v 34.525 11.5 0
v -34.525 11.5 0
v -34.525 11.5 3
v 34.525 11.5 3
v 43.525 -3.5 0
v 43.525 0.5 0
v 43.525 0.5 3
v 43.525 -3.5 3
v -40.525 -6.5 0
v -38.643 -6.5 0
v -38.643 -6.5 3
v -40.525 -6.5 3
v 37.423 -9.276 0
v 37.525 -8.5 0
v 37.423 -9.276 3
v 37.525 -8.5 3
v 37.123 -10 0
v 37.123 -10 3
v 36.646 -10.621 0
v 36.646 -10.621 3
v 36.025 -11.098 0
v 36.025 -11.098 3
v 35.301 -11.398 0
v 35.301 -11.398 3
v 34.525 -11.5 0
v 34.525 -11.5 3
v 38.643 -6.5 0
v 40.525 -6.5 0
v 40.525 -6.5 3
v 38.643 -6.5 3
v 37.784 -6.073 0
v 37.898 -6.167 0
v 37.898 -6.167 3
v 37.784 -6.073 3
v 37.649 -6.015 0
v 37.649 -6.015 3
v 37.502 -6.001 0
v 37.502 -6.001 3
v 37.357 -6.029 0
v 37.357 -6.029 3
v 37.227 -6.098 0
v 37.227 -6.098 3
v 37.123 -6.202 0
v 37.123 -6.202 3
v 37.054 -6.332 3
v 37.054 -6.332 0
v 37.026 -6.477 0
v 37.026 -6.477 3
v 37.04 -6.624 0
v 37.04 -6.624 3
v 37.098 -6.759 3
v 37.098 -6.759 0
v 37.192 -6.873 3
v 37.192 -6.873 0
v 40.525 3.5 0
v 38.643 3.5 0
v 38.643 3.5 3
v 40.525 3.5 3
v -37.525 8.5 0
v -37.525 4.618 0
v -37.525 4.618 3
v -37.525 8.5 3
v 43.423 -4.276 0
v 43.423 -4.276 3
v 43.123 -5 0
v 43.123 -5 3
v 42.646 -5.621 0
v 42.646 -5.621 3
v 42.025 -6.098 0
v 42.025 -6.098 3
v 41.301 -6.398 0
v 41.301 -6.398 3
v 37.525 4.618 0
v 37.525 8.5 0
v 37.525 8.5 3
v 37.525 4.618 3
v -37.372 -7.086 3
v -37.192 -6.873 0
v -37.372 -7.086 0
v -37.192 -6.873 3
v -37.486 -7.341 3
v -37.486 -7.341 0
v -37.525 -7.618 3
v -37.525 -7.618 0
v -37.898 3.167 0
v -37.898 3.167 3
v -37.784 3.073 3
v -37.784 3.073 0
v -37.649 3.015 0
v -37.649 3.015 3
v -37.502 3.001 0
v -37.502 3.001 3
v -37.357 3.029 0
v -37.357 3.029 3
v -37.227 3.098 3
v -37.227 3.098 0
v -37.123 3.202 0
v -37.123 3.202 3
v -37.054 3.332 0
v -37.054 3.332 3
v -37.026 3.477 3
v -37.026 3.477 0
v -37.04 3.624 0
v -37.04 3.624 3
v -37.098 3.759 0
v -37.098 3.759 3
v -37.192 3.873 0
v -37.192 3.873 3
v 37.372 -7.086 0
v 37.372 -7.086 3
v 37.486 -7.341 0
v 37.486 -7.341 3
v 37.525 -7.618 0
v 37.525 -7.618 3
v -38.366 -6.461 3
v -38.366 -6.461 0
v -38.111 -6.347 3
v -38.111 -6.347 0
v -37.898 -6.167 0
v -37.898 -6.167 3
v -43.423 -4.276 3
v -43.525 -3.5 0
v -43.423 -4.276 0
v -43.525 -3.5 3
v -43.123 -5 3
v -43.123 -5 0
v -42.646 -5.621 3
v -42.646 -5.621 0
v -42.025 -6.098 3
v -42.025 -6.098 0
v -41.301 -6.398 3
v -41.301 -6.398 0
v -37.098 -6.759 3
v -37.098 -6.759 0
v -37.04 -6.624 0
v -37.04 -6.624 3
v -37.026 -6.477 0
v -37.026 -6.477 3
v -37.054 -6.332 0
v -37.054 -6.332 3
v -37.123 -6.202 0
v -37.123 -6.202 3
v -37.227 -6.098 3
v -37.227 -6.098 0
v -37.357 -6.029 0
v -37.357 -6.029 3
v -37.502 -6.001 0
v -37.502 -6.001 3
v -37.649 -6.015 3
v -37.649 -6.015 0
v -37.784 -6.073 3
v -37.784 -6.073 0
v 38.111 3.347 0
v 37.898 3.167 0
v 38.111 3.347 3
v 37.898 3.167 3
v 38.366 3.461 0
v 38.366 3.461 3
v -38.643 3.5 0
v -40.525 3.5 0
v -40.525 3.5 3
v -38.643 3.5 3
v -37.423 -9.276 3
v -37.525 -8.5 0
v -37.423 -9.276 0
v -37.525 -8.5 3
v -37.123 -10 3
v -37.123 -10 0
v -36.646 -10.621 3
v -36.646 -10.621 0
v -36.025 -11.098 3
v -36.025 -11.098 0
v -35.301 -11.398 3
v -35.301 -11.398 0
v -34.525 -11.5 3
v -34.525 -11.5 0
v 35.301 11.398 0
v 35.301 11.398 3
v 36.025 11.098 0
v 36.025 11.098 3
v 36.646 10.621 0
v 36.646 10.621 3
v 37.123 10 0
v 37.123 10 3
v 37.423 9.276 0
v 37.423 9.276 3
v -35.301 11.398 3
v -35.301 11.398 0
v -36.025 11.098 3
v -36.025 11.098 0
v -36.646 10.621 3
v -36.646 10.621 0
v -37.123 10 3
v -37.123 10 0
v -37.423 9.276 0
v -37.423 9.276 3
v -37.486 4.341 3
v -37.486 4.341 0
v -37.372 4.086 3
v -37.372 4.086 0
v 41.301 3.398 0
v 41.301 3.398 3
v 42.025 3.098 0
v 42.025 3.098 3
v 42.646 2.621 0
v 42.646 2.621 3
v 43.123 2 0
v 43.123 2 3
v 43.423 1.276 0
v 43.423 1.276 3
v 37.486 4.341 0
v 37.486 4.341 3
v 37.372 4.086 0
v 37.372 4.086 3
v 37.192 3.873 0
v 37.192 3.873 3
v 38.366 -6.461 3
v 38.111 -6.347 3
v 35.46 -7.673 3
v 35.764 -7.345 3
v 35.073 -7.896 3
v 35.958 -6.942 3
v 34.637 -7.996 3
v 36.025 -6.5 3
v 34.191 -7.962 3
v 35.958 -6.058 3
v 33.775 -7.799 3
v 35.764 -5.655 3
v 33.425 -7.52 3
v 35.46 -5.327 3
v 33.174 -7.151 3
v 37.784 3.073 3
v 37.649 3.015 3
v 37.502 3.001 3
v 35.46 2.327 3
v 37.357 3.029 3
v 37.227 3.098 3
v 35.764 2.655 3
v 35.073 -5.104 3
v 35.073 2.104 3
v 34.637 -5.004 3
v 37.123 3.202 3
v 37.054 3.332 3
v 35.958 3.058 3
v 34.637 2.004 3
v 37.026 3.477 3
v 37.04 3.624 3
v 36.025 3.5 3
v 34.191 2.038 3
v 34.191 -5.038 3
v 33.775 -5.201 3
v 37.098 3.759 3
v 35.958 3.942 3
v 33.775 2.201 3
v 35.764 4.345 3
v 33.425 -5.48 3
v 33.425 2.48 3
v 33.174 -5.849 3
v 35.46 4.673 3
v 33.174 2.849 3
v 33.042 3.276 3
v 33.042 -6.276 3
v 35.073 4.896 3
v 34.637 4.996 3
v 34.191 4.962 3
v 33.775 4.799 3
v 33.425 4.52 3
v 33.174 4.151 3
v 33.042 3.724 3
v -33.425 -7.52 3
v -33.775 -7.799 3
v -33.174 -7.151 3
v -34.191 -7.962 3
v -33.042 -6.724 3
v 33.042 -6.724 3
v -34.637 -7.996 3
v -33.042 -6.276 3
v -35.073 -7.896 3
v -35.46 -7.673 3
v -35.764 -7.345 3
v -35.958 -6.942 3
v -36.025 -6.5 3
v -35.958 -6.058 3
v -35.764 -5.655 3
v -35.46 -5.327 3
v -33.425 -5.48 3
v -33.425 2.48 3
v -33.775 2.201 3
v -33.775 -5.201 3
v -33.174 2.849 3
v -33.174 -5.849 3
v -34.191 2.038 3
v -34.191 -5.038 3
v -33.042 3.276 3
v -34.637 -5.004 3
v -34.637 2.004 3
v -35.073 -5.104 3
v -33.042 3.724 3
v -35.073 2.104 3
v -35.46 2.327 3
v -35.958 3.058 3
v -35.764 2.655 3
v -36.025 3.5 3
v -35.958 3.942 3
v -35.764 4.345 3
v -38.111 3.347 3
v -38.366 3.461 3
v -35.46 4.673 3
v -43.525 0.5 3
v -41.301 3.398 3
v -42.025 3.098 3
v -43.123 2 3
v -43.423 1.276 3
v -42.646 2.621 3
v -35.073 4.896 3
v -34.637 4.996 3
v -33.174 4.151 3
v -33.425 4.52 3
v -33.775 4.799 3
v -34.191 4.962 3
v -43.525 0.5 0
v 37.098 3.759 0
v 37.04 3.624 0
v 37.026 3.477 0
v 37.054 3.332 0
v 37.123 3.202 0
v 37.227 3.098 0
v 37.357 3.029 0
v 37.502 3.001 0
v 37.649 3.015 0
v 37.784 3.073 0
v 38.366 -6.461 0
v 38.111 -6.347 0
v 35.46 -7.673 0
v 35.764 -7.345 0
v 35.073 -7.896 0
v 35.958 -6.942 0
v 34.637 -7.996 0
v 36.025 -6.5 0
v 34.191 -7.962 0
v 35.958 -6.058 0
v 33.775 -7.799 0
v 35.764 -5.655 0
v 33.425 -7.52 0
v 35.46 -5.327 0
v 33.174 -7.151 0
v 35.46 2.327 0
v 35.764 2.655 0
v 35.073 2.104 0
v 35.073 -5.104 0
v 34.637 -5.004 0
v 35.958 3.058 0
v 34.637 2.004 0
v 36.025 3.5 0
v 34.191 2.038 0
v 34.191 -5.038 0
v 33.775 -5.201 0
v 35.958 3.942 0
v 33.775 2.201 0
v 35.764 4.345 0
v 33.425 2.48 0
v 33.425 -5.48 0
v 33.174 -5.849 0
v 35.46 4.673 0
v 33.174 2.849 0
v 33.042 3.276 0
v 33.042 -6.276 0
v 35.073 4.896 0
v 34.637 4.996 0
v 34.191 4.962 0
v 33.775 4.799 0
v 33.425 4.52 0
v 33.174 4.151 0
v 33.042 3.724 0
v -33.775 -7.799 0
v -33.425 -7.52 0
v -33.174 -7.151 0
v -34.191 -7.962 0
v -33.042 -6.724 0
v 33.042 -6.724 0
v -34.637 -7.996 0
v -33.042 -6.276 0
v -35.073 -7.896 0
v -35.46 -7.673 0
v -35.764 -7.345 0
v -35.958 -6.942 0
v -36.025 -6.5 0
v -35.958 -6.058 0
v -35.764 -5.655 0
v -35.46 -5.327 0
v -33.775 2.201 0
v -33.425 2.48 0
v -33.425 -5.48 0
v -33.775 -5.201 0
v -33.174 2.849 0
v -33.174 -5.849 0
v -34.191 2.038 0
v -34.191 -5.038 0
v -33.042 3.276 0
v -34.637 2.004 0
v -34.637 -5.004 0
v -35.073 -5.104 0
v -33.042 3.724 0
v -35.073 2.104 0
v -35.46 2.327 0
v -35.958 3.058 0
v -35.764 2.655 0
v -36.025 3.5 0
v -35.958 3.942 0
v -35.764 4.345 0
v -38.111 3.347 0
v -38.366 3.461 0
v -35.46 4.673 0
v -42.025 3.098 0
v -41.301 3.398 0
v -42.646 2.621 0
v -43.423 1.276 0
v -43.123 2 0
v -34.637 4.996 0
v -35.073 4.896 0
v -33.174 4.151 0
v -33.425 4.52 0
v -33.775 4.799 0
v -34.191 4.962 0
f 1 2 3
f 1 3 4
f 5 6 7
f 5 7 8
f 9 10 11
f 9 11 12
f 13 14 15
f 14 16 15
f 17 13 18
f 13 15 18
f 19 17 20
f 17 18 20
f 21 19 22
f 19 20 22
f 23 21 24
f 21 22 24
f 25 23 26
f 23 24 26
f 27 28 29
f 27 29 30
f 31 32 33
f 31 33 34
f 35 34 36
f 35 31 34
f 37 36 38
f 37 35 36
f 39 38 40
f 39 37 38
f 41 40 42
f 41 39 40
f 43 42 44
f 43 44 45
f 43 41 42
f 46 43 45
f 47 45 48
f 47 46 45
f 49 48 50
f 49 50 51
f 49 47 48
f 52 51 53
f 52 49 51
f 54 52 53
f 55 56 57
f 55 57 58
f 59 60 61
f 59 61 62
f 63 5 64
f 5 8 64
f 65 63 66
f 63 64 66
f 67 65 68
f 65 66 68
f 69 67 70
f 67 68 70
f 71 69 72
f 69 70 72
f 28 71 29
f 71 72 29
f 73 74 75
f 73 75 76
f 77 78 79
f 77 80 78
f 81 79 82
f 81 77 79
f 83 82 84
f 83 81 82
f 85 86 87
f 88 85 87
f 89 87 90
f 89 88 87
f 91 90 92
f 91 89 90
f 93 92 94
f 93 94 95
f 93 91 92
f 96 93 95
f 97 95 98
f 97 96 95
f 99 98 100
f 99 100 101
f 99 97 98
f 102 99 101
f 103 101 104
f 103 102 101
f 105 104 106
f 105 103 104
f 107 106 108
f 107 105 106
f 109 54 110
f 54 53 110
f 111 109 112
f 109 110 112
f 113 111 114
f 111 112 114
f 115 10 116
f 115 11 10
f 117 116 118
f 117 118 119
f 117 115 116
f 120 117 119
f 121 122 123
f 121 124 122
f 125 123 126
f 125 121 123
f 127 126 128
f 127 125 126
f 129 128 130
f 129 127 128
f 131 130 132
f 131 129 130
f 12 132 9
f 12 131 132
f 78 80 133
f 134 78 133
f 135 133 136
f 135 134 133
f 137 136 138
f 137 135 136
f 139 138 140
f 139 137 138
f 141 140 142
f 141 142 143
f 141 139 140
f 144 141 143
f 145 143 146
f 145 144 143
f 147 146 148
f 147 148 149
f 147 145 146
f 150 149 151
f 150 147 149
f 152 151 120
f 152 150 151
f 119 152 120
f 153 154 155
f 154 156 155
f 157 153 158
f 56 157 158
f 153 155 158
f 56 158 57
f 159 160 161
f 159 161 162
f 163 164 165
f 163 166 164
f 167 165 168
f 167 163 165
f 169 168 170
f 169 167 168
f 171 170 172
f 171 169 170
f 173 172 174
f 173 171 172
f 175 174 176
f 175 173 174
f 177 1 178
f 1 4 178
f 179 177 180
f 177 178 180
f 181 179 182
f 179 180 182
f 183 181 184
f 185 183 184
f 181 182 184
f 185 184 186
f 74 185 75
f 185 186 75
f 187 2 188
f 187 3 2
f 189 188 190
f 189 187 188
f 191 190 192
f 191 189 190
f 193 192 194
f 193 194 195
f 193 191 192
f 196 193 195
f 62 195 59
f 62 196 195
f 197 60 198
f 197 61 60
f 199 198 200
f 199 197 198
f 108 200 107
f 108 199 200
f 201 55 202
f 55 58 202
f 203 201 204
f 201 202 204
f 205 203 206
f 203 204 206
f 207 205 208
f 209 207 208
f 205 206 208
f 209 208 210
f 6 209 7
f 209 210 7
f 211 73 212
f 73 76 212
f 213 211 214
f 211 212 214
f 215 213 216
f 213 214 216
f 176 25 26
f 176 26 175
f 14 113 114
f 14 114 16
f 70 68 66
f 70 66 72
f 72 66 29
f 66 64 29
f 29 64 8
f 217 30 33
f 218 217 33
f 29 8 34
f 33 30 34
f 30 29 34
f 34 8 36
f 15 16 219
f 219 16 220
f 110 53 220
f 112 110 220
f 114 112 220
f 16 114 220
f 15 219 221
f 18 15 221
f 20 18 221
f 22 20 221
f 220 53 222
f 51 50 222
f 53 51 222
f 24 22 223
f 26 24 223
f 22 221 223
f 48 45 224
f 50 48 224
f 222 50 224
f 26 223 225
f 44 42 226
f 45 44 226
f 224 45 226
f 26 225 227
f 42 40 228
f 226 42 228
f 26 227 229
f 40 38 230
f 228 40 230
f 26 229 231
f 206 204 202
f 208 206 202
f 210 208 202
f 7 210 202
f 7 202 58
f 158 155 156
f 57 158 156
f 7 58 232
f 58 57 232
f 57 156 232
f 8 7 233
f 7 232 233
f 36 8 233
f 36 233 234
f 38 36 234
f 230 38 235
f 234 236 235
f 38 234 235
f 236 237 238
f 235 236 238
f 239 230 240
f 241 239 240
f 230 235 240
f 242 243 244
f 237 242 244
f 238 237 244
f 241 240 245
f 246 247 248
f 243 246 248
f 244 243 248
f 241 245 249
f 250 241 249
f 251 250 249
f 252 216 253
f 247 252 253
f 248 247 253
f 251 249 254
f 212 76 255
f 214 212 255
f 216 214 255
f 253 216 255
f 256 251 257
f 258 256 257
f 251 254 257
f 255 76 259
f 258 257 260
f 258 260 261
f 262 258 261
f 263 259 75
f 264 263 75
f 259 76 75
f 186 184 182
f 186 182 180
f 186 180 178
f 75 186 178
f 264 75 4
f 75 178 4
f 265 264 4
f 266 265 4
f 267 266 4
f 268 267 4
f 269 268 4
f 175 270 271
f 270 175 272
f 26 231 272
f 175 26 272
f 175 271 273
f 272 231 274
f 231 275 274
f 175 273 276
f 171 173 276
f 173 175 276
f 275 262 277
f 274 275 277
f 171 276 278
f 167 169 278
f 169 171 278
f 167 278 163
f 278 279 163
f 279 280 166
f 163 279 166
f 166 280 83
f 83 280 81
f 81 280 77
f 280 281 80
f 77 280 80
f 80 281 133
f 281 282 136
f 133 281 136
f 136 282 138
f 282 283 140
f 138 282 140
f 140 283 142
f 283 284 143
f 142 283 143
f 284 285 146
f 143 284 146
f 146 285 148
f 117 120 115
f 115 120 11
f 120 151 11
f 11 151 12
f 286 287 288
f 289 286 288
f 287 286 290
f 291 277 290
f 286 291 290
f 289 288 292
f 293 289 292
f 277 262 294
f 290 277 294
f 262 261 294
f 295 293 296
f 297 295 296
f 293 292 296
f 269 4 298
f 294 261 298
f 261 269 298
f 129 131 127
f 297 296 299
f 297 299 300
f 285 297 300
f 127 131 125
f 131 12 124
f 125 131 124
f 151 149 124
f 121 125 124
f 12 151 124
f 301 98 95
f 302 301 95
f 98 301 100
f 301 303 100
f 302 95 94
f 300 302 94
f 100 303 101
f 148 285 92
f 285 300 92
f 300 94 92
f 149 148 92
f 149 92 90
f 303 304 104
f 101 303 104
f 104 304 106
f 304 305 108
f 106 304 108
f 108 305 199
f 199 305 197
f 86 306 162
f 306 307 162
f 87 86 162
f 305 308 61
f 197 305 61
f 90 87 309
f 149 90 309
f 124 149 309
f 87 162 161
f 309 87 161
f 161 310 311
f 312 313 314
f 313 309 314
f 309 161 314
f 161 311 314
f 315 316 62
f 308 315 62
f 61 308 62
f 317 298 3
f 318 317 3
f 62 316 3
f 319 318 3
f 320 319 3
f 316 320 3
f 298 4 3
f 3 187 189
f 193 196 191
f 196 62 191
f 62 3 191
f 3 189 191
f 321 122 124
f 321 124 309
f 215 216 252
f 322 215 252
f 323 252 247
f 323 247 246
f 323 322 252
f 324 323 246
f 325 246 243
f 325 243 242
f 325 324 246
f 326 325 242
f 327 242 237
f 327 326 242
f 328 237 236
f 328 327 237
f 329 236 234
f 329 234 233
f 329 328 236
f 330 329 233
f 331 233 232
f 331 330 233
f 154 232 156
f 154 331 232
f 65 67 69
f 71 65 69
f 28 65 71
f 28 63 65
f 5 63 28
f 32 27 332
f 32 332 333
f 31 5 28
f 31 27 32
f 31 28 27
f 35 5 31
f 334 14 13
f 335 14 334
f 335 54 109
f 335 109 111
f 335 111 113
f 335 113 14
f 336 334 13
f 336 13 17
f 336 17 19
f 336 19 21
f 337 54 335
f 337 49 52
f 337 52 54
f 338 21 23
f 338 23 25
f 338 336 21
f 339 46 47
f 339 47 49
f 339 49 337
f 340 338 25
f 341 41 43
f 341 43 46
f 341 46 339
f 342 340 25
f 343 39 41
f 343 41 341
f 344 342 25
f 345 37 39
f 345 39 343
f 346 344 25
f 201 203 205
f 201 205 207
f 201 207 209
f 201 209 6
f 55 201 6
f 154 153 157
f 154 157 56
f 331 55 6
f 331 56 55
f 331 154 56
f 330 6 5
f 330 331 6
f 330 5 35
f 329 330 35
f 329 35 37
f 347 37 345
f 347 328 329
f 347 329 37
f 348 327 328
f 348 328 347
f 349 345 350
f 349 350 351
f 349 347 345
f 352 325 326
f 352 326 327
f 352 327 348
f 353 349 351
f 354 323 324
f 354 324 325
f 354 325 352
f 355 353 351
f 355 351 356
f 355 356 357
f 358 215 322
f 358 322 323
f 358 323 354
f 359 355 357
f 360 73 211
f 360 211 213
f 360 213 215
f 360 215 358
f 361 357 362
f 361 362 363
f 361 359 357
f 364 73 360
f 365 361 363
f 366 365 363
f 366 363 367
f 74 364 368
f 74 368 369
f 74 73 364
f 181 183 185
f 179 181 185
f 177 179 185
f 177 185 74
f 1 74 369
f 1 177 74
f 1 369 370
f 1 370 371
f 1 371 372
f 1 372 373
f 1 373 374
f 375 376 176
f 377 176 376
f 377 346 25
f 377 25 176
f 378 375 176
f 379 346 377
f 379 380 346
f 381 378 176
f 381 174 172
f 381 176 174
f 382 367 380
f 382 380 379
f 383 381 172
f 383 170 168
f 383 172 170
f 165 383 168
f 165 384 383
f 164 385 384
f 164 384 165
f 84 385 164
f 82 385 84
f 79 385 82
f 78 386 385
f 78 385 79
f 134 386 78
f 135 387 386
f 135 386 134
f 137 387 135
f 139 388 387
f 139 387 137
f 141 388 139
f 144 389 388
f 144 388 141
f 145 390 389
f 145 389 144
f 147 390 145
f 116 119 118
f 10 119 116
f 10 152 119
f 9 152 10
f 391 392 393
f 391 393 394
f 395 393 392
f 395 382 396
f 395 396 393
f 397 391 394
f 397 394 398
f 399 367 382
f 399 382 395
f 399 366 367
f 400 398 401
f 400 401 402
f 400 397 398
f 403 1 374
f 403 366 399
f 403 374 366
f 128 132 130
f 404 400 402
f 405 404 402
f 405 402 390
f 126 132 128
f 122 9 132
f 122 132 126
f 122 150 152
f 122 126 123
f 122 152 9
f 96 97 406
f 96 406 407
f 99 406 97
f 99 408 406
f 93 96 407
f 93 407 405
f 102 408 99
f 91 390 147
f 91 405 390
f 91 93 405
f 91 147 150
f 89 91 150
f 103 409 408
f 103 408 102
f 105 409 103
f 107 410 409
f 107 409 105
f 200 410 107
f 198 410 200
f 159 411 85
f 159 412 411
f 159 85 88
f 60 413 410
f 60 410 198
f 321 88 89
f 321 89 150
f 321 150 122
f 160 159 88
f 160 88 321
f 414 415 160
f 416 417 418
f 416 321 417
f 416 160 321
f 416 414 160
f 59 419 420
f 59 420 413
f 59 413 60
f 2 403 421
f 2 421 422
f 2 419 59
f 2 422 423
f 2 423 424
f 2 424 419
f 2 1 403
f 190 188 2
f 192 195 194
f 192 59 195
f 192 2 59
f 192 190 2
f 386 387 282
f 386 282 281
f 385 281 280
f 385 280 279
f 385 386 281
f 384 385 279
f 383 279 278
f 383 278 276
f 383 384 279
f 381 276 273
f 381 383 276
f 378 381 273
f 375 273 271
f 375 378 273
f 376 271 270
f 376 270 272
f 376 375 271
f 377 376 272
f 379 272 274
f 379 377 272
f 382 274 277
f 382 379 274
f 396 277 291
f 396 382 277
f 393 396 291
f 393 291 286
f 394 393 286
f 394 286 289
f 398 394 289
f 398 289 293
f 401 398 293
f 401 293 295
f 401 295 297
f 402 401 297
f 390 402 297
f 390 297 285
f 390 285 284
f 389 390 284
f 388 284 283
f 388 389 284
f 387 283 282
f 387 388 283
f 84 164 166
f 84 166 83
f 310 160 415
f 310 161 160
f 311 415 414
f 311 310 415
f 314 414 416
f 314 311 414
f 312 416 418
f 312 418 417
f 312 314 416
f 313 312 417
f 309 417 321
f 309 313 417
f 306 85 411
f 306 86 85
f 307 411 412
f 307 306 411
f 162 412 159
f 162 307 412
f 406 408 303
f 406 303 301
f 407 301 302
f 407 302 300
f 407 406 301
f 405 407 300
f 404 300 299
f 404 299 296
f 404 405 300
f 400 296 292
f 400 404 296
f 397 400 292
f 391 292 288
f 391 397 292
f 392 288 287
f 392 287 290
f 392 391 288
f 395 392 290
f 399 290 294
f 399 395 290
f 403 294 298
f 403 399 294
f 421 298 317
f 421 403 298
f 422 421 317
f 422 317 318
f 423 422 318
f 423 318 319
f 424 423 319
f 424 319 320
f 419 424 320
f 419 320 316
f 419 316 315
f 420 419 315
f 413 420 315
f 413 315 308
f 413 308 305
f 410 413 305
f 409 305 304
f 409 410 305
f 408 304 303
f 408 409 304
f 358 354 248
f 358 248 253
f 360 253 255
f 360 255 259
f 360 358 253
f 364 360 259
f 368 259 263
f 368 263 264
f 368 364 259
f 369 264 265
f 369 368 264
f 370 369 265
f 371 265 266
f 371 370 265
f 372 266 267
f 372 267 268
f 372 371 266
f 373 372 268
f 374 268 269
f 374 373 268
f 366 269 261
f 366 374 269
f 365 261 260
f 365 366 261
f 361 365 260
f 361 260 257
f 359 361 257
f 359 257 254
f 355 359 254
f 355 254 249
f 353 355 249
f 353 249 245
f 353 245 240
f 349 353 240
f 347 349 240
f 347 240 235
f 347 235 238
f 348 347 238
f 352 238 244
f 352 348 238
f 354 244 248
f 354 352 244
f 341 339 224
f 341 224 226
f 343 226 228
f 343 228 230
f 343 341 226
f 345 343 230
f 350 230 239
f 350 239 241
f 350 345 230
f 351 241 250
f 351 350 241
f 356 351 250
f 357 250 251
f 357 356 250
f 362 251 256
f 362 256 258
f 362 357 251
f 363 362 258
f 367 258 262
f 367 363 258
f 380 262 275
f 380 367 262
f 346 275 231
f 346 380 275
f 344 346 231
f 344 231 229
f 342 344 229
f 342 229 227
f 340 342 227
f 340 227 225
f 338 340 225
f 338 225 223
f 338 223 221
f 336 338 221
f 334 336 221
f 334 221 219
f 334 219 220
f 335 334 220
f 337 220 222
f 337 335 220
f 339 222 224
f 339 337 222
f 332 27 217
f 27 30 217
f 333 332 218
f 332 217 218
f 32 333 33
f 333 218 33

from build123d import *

# Parameters (mm, degrees)
SKETCH_1_R      = 1.5
EXTRUDE_1_DEPTH = 3
FILLET_1_R      = 3
FILLET_2_R      = 1


with BuildPart() as part:
    # 草图1 → 凸台-拉伸1 (new body)
    with BuildSketch(Plane.XY):
        with BuildLine():
            Line((-37.525, 11.5), (37.525, 11.5))
            Line((37.525, 11.5), (37.525, 4))
            ThreePointArc((37.525, 4), (37.171446609, 3.146446609), (38.025, 3.5))
            Line((38.025, 3.5), (43.525, 3.5))
            Line((43.525, 3.5), (43.525, -6.5))
            Line((43.525, -6.5), (38.025, -6.5))
            ThreePointArc((38.025, -6.5), (37.171446609, -6.146446609), (37.525, -7))
            Line((37.525, -7), (37.525, -11.5))
            Line((37.525, -11.5), (-37.525, -11.5))
            Line((-37.525, -11.5), (-37.525, -7))
            ThreePointArc((-37.525, -7), (-37.171446609, -6.146446609), (-38.025, -6.5))
            Line((-38.025, -6.5), (-43.525, -6.5))
            Line((-43.525, -6.5), (-43.525, 3.5))
            Line((-43.525, 3.5), (-38.025, 3.5))
            ThreePointArc((-38.025, 3.5), (-37.171446609, 3.146446609), (-37.525, 4))
            Line((-37.525, 4), (-37.525, 11.5))
        make_face()
        with Locations((34.525, 3.5)):
            Circle(SKETCH_1_R, mode=Mode.SUBTRACT)
        with Locations((34.525, -6.5)):
            Circle(SKETCH_1_R, mode=Mode.SUBTRACT)
        with Locations(Location((-34.525, -6.5, 0), (0, 0, 180))):
            Circle(SKETCH_1_R, mode=Mode.SUBTRACT)
        with Locations(Location((-34.525, 3.5, 0), (0, 0, 180))):
            Circle(SKETCH_1_R, mode=Mode.SUBTRACT)
    extrude(amount=EXTRUDE_1_DEPTH)

    # 圆角1
    fillet_1_edges = [part.edges().sort_by_distance(p)[0] for p in [
        (37.525, -11.5, 1.5),
        (-37.525, -11.5, 1.5),
        (-43.525, -6.5, 1.5),
        (-43.525, 3.5, 1.5),
        (-37.525, 11.5, 1.5),
        (37.525, 11.5, 1.5),
        (43.525, 3.5, 1.5),
        (43.525, -6.5, 1.5),
    ]]
    fillet(fillet_1_edges, radius=FILLET_1_R)

    # 圆角2
    fillet_2_edges = [part.edges().sort_by_distance(p)[0] for p in [
        (-37.525, -7, 1.5),
        (-38.025, -6.5, 1.5),
        (-38.025, 3.5, 1.5),
        (-37.525, 4, 1.5),
        (37.525, 4, 1.5),
        (38.025, 3.5, 1.5),
        (38.025, -6.5, 1.5),
        (37.525, -7, 1.5),
    ]]
    fillet(fillet_2_edges, radius=FILLET_2_R)


solid = part.part
